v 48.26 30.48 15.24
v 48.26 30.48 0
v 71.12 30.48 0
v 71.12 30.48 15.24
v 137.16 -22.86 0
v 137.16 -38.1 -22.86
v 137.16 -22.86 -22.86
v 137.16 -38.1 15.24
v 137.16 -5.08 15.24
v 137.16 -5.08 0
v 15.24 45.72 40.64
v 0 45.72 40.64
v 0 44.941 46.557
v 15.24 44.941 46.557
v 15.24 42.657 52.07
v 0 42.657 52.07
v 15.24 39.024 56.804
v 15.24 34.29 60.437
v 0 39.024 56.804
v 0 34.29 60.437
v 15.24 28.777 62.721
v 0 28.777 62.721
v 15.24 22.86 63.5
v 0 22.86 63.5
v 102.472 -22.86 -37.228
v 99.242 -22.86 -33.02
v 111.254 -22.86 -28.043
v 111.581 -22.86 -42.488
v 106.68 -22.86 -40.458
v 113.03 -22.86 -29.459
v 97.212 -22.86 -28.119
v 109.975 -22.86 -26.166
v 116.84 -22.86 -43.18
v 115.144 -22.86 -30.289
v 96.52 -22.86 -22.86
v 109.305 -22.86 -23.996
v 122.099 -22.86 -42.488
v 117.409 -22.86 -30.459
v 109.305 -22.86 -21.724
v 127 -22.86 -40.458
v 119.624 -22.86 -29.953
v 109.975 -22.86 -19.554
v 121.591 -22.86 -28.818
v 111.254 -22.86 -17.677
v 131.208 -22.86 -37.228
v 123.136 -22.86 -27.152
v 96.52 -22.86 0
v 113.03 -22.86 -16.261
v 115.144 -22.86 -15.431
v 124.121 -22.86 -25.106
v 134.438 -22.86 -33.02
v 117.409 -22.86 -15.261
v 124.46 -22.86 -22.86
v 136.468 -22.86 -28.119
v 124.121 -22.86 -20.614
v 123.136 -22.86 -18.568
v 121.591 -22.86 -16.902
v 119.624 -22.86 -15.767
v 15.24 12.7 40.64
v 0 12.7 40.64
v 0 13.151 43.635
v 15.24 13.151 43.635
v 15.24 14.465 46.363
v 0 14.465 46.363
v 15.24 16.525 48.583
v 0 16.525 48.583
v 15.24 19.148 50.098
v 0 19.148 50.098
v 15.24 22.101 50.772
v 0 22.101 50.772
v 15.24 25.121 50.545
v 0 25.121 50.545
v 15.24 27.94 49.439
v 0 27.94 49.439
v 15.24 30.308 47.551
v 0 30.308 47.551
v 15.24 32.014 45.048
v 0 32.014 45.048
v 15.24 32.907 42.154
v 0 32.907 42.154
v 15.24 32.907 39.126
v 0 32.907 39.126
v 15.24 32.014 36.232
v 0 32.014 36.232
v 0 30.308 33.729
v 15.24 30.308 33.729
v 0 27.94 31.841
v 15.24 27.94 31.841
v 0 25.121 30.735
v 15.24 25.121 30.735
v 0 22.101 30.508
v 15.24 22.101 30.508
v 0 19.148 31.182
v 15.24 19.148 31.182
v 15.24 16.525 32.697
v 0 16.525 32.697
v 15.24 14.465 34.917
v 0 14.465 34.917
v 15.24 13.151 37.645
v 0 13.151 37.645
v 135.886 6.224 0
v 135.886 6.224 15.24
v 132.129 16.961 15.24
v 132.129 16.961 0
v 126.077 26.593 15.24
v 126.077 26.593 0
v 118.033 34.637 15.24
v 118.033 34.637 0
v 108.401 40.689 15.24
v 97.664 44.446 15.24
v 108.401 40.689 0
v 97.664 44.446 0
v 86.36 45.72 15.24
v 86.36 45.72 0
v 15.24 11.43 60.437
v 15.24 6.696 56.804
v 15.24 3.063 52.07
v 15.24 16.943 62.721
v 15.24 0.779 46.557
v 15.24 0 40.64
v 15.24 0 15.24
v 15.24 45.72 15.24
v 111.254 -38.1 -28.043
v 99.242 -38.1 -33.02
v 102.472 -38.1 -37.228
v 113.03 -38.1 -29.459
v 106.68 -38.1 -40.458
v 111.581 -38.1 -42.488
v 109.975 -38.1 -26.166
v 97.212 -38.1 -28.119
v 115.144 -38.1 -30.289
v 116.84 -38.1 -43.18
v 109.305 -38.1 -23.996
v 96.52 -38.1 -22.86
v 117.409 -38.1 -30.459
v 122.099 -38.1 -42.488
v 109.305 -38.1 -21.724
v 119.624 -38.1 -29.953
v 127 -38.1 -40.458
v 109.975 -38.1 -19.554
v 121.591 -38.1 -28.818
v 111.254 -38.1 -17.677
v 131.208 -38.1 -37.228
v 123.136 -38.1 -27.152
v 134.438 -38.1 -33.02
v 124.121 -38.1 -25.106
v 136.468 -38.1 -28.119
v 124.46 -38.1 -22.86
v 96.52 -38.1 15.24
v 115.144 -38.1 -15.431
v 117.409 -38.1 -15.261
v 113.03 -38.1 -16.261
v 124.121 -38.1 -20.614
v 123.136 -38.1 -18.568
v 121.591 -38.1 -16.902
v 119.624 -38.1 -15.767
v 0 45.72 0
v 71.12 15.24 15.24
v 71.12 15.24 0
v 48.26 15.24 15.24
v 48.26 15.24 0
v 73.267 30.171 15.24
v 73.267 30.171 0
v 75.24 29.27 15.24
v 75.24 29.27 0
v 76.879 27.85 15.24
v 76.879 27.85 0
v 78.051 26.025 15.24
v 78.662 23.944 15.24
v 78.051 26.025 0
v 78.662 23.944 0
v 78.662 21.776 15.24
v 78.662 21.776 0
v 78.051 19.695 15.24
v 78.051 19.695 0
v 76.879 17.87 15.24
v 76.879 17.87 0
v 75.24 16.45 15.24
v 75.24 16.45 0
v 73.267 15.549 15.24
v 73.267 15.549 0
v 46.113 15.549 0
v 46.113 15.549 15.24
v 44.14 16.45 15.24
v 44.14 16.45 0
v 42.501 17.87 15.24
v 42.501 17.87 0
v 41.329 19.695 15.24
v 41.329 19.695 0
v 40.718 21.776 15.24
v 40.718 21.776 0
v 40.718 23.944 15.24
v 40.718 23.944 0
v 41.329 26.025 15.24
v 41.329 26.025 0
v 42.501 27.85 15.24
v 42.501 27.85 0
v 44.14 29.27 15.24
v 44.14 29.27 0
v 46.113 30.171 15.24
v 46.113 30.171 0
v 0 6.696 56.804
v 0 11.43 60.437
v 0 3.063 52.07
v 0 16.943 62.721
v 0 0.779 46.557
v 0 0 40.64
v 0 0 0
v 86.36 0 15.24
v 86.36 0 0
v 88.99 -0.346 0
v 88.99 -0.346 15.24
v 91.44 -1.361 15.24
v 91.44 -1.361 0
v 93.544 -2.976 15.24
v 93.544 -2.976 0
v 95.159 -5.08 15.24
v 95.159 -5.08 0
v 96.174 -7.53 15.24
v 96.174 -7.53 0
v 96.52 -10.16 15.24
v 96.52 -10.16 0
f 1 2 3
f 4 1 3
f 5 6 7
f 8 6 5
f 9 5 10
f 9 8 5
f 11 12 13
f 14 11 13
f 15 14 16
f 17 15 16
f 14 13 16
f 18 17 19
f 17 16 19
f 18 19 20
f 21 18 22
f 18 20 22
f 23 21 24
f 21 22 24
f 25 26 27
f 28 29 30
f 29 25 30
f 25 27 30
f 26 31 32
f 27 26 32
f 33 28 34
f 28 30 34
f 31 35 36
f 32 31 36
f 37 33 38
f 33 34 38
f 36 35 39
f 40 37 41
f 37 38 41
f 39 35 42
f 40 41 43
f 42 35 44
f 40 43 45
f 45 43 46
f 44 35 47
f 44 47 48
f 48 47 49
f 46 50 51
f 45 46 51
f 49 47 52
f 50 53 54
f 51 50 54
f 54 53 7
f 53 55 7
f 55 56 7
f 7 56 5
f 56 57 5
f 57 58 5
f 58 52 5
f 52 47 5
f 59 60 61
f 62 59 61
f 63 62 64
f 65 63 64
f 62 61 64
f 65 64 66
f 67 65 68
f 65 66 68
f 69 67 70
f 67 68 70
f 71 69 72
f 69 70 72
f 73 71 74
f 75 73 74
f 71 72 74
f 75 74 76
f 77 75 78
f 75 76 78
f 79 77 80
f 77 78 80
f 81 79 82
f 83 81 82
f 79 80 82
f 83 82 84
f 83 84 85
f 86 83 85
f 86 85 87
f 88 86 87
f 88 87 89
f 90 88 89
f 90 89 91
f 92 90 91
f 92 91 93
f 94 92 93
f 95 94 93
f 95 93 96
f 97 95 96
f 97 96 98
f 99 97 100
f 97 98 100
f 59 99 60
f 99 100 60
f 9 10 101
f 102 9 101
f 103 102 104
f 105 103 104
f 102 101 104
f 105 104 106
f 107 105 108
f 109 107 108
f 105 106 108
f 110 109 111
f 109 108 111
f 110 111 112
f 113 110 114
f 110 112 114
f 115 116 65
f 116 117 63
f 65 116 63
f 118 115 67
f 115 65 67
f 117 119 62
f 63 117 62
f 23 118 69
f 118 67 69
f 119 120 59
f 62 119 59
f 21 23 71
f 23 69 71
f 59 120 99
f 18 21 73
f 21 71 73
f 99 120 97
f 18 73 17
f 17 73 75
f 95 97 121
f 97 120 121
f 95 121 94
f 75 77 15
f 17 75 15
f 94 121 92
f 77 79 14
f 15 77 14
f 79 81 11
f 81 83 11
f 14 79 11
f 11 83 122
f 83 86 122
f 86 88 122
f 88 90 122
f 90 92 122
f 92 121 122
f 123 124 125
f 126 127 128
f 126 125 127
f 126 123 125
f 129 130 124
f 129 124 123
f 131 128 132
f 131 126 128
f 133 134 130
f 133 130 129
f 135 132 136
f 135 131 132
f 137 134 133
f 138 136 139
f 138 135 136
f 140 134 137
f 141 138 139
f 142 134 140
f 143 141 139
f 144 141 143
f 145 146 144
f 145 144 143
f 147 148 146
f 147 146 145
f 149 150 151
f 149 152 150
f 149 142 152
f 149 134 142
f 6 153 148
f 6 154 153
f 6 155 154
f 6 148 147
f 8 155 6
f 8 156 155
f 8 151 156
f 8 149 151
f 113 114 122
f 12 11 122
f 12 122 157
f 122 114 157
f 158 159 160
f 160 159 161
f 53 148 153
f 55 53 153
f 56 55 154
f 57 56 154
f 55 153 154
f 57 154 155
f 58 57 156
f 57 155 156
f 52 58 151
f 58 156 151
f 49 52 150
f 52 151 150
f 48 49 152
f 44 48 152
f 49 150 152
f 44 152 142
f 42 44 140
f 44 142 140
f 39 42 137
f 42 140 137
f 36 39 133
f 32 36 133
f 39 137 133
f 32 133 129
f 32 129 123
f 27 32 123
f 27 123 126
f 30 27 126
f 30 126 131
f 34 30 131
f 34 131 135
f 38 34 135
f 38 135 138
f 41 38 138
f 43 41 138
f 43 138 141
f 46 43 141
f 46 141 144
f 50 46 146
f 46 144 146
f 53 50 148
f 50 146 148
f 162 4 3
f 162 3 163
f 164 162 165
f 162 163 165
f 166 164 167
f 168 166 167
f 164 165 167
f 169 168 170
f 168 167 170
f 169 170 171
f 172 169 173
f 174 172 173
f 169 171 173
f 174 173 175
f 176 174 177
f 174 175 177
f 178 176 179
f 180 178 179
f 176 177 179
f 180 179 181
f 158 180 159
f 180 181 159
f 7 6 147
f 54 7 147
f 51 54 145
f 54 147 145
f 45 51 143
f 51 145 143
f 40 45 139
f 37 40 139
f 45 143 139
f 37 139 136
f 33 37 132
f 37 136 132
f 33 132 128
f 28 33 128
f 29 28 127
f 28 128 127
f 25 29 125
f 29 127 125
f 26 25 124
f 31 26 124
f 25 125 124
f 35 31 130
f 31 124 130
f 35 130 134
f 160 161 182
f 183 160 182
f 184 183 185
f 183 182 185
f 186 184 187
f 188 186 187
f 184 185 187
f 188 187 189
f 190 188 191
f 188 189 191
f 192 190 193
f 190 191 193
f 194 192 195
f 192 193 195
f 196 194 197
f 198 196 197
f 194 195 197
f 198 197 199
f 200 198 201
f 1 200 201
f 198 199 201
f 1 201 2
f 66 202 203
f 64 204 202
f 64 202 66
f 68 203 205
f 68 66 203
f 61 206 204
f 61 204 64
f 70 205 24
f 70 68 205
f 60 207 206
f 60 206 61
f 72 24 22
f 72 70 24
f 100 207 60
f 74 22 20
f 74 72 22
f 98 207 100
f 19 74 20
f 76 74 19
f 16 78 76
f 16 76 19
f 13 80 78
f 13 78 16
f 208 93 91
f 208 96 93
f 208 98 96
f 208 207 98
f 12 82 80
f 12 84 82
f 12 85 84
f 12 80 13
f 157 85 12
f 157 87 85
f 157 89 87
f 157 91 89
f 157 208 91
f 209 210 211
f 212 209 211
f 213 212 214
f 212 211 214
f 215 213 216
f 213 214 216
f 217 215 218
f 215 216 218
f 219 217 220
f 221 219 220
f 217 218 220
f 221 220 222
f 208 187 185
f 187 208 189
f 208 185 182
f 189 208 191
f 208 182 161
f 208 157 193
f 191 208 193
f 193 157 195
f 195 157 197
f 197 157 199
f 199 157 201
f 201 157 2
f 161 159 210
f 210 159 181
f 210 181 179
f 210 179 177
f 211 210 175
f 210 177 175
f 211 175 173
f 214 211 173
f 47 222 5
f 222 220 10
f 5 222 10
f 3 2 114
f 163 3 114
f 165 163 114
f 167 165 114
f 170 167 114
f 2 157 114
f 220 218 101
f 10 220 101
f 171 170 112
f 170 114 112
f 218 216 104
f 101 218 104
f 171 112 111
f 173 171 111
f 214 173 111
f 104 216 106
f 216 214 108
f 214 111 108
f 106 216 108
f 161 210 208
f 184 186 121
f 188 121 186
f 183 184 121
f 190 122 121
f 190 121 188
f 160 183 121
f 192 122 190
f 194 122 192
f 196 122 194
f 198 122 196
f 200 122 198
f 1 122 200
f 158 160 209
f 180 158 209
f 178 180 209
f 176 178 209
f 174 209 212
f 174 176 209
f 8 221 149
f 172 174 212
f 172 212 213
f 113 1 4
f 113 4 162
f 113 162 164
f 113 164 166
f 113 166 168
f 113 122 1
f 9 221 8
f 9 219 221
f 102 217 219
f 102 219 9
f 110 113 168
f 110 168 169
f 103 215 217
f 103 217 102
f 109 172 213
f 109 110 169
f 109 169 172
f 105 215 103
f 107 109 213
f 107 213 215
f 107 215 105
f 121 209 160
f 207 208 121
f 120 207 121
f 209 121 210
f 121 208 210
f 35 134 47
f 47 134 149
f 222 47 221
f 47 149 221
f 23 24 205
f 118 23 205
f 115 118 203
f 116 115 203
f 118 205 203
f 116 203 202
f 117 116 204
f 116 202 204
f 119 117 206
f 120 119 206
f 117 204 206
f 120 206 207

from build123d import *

# Parameters (mm, degrees)
F0_W     = 15.24
F0_H     = 45.72
F0_W_2   = 40.64
F0_H_2   = 15.24
F1_DEPTH = 15.24
F2_DEPTH = 63.5
F3_DEPTH = 43.18
F4_R     = 10.16
F5_DEPTH = 15.24
F6_R     = 7.62
F7_DEPTH = 15.24


with BuildPart() as f1:
    # F0 (on Top) → F1 (new body)
    with BuildSketch(Plane.XY):
        with BuildLine():
            Line((15.24, 45.72), (15.24, 0))
            Line((15.24, 0), (86.36, 0))
            ThreePointArc((86.36, 0), (93.544205, -2.975795), (96.52, -10.16))
            Line((96.52, -10.16), (96.52, -22.86))
            Line((96.52, -22.86), (137.16, -22.86))
            Line((137.16, -22.86), (137.16, -5.08))
            ThreePointArc((137.16, -5.08), (122.281024, 30.841024), (86.36, 45.72))
            Line((86.36, 45.72), (15.24, 45.72))
        make_face()
        with BuildLine():
            ThreePointArc((48.26, 15.24), (40.64, 22.86), (48.26, 30.48))
            Line((48.26, 30.48), (71.12, 30.48))
            ThreePointArc((71.12, 30.48), (78.74, 22.86), (71.12, 15.24))
            Line((71.12, 15.24), (48.26, 15.24))
        make_face(mode=Mode.SUBTRACT)
        with Locations((7.62, 22.86)):
            Rectangle(F0_W, F0_H)
        with Locations((116.84, -30.48)):
            Rectangle(F0_W_2, F0_H_2)
    extrude(amount=F1_DEPTH)

    # F0 (on Top) → F2 (join)
    with BuildSketch(Plane.XY):
        with Locations((7.62, 22.86)):
            Rectangle(F0_W, F0_H)
    extrude(amount=F2_DEPTH)

    # F0 (on Top) → F3 (join)
    with BuildSketch(Plane.XY):
        with Locations((116.84, -30.48)):
            Rectangle(F0_W_2, F0_H_2)
    extrude(amount=-F3_DEPTH)

    # F4 (on face) → F5 (cut, through all)
    with BuildSketch(Plane(origin=(0, 0, 0), x_dir=(0, -1, 0), z_dir=(-1, 0, 0))):
        with BuildLine():
            ThreePointArc((-22.86, 63.5), (-6.695539, 56.804461), (0, 40.64))
            Line((0, 40.64), (0, 63.5))
            Line((0, 63.5), (-22.86, 63.5))
        make_face()
        with BuildLine():
            Line((-45.72, 63.5), (-45.72, 40.64))
            ThreePointArc((-45.72, 40.64), (-39.024461, 56.804461), (-22.86, 63.5))
            Line((-22.86, 63.5), (-45.72, 63.5))
        make_face()
        with Locations((-22.86, 40.64)):
            Circle(F4_R)
    extrude(amount=-F5_DEPTH, mode=Mode.SUBTRACT)

    # F6 (on face) → F7 (cut, through all)
    with BuildSketch(Plane.XZ.offset(38.1)):
        with BuildLine():
            ThreePointArc((137.16, -22.86), (131.20841, -37.22841), (116.84, -43.18))
            Line((116.84, -43.18), (137.16, -43.18))
            Line((137.16, -43.18), (137.16, -22.86))
        make_face()
        with BuildLine():
            ThreePointArc((116.84, -43.18), (102.47159, -37.22841), (96.52, -22.86))
            Line((96.52, -22.86), (96.52, -43.18))
            Line((96.52, -43.18), (116.84, -43.18))
        make_face()
        with Locations((116.84, -22.86)):
            Circle(F6_R)
    extrude(amount=-F7_DEPTH, mode=Mode.SUBTRACT)


solid = f1.part
